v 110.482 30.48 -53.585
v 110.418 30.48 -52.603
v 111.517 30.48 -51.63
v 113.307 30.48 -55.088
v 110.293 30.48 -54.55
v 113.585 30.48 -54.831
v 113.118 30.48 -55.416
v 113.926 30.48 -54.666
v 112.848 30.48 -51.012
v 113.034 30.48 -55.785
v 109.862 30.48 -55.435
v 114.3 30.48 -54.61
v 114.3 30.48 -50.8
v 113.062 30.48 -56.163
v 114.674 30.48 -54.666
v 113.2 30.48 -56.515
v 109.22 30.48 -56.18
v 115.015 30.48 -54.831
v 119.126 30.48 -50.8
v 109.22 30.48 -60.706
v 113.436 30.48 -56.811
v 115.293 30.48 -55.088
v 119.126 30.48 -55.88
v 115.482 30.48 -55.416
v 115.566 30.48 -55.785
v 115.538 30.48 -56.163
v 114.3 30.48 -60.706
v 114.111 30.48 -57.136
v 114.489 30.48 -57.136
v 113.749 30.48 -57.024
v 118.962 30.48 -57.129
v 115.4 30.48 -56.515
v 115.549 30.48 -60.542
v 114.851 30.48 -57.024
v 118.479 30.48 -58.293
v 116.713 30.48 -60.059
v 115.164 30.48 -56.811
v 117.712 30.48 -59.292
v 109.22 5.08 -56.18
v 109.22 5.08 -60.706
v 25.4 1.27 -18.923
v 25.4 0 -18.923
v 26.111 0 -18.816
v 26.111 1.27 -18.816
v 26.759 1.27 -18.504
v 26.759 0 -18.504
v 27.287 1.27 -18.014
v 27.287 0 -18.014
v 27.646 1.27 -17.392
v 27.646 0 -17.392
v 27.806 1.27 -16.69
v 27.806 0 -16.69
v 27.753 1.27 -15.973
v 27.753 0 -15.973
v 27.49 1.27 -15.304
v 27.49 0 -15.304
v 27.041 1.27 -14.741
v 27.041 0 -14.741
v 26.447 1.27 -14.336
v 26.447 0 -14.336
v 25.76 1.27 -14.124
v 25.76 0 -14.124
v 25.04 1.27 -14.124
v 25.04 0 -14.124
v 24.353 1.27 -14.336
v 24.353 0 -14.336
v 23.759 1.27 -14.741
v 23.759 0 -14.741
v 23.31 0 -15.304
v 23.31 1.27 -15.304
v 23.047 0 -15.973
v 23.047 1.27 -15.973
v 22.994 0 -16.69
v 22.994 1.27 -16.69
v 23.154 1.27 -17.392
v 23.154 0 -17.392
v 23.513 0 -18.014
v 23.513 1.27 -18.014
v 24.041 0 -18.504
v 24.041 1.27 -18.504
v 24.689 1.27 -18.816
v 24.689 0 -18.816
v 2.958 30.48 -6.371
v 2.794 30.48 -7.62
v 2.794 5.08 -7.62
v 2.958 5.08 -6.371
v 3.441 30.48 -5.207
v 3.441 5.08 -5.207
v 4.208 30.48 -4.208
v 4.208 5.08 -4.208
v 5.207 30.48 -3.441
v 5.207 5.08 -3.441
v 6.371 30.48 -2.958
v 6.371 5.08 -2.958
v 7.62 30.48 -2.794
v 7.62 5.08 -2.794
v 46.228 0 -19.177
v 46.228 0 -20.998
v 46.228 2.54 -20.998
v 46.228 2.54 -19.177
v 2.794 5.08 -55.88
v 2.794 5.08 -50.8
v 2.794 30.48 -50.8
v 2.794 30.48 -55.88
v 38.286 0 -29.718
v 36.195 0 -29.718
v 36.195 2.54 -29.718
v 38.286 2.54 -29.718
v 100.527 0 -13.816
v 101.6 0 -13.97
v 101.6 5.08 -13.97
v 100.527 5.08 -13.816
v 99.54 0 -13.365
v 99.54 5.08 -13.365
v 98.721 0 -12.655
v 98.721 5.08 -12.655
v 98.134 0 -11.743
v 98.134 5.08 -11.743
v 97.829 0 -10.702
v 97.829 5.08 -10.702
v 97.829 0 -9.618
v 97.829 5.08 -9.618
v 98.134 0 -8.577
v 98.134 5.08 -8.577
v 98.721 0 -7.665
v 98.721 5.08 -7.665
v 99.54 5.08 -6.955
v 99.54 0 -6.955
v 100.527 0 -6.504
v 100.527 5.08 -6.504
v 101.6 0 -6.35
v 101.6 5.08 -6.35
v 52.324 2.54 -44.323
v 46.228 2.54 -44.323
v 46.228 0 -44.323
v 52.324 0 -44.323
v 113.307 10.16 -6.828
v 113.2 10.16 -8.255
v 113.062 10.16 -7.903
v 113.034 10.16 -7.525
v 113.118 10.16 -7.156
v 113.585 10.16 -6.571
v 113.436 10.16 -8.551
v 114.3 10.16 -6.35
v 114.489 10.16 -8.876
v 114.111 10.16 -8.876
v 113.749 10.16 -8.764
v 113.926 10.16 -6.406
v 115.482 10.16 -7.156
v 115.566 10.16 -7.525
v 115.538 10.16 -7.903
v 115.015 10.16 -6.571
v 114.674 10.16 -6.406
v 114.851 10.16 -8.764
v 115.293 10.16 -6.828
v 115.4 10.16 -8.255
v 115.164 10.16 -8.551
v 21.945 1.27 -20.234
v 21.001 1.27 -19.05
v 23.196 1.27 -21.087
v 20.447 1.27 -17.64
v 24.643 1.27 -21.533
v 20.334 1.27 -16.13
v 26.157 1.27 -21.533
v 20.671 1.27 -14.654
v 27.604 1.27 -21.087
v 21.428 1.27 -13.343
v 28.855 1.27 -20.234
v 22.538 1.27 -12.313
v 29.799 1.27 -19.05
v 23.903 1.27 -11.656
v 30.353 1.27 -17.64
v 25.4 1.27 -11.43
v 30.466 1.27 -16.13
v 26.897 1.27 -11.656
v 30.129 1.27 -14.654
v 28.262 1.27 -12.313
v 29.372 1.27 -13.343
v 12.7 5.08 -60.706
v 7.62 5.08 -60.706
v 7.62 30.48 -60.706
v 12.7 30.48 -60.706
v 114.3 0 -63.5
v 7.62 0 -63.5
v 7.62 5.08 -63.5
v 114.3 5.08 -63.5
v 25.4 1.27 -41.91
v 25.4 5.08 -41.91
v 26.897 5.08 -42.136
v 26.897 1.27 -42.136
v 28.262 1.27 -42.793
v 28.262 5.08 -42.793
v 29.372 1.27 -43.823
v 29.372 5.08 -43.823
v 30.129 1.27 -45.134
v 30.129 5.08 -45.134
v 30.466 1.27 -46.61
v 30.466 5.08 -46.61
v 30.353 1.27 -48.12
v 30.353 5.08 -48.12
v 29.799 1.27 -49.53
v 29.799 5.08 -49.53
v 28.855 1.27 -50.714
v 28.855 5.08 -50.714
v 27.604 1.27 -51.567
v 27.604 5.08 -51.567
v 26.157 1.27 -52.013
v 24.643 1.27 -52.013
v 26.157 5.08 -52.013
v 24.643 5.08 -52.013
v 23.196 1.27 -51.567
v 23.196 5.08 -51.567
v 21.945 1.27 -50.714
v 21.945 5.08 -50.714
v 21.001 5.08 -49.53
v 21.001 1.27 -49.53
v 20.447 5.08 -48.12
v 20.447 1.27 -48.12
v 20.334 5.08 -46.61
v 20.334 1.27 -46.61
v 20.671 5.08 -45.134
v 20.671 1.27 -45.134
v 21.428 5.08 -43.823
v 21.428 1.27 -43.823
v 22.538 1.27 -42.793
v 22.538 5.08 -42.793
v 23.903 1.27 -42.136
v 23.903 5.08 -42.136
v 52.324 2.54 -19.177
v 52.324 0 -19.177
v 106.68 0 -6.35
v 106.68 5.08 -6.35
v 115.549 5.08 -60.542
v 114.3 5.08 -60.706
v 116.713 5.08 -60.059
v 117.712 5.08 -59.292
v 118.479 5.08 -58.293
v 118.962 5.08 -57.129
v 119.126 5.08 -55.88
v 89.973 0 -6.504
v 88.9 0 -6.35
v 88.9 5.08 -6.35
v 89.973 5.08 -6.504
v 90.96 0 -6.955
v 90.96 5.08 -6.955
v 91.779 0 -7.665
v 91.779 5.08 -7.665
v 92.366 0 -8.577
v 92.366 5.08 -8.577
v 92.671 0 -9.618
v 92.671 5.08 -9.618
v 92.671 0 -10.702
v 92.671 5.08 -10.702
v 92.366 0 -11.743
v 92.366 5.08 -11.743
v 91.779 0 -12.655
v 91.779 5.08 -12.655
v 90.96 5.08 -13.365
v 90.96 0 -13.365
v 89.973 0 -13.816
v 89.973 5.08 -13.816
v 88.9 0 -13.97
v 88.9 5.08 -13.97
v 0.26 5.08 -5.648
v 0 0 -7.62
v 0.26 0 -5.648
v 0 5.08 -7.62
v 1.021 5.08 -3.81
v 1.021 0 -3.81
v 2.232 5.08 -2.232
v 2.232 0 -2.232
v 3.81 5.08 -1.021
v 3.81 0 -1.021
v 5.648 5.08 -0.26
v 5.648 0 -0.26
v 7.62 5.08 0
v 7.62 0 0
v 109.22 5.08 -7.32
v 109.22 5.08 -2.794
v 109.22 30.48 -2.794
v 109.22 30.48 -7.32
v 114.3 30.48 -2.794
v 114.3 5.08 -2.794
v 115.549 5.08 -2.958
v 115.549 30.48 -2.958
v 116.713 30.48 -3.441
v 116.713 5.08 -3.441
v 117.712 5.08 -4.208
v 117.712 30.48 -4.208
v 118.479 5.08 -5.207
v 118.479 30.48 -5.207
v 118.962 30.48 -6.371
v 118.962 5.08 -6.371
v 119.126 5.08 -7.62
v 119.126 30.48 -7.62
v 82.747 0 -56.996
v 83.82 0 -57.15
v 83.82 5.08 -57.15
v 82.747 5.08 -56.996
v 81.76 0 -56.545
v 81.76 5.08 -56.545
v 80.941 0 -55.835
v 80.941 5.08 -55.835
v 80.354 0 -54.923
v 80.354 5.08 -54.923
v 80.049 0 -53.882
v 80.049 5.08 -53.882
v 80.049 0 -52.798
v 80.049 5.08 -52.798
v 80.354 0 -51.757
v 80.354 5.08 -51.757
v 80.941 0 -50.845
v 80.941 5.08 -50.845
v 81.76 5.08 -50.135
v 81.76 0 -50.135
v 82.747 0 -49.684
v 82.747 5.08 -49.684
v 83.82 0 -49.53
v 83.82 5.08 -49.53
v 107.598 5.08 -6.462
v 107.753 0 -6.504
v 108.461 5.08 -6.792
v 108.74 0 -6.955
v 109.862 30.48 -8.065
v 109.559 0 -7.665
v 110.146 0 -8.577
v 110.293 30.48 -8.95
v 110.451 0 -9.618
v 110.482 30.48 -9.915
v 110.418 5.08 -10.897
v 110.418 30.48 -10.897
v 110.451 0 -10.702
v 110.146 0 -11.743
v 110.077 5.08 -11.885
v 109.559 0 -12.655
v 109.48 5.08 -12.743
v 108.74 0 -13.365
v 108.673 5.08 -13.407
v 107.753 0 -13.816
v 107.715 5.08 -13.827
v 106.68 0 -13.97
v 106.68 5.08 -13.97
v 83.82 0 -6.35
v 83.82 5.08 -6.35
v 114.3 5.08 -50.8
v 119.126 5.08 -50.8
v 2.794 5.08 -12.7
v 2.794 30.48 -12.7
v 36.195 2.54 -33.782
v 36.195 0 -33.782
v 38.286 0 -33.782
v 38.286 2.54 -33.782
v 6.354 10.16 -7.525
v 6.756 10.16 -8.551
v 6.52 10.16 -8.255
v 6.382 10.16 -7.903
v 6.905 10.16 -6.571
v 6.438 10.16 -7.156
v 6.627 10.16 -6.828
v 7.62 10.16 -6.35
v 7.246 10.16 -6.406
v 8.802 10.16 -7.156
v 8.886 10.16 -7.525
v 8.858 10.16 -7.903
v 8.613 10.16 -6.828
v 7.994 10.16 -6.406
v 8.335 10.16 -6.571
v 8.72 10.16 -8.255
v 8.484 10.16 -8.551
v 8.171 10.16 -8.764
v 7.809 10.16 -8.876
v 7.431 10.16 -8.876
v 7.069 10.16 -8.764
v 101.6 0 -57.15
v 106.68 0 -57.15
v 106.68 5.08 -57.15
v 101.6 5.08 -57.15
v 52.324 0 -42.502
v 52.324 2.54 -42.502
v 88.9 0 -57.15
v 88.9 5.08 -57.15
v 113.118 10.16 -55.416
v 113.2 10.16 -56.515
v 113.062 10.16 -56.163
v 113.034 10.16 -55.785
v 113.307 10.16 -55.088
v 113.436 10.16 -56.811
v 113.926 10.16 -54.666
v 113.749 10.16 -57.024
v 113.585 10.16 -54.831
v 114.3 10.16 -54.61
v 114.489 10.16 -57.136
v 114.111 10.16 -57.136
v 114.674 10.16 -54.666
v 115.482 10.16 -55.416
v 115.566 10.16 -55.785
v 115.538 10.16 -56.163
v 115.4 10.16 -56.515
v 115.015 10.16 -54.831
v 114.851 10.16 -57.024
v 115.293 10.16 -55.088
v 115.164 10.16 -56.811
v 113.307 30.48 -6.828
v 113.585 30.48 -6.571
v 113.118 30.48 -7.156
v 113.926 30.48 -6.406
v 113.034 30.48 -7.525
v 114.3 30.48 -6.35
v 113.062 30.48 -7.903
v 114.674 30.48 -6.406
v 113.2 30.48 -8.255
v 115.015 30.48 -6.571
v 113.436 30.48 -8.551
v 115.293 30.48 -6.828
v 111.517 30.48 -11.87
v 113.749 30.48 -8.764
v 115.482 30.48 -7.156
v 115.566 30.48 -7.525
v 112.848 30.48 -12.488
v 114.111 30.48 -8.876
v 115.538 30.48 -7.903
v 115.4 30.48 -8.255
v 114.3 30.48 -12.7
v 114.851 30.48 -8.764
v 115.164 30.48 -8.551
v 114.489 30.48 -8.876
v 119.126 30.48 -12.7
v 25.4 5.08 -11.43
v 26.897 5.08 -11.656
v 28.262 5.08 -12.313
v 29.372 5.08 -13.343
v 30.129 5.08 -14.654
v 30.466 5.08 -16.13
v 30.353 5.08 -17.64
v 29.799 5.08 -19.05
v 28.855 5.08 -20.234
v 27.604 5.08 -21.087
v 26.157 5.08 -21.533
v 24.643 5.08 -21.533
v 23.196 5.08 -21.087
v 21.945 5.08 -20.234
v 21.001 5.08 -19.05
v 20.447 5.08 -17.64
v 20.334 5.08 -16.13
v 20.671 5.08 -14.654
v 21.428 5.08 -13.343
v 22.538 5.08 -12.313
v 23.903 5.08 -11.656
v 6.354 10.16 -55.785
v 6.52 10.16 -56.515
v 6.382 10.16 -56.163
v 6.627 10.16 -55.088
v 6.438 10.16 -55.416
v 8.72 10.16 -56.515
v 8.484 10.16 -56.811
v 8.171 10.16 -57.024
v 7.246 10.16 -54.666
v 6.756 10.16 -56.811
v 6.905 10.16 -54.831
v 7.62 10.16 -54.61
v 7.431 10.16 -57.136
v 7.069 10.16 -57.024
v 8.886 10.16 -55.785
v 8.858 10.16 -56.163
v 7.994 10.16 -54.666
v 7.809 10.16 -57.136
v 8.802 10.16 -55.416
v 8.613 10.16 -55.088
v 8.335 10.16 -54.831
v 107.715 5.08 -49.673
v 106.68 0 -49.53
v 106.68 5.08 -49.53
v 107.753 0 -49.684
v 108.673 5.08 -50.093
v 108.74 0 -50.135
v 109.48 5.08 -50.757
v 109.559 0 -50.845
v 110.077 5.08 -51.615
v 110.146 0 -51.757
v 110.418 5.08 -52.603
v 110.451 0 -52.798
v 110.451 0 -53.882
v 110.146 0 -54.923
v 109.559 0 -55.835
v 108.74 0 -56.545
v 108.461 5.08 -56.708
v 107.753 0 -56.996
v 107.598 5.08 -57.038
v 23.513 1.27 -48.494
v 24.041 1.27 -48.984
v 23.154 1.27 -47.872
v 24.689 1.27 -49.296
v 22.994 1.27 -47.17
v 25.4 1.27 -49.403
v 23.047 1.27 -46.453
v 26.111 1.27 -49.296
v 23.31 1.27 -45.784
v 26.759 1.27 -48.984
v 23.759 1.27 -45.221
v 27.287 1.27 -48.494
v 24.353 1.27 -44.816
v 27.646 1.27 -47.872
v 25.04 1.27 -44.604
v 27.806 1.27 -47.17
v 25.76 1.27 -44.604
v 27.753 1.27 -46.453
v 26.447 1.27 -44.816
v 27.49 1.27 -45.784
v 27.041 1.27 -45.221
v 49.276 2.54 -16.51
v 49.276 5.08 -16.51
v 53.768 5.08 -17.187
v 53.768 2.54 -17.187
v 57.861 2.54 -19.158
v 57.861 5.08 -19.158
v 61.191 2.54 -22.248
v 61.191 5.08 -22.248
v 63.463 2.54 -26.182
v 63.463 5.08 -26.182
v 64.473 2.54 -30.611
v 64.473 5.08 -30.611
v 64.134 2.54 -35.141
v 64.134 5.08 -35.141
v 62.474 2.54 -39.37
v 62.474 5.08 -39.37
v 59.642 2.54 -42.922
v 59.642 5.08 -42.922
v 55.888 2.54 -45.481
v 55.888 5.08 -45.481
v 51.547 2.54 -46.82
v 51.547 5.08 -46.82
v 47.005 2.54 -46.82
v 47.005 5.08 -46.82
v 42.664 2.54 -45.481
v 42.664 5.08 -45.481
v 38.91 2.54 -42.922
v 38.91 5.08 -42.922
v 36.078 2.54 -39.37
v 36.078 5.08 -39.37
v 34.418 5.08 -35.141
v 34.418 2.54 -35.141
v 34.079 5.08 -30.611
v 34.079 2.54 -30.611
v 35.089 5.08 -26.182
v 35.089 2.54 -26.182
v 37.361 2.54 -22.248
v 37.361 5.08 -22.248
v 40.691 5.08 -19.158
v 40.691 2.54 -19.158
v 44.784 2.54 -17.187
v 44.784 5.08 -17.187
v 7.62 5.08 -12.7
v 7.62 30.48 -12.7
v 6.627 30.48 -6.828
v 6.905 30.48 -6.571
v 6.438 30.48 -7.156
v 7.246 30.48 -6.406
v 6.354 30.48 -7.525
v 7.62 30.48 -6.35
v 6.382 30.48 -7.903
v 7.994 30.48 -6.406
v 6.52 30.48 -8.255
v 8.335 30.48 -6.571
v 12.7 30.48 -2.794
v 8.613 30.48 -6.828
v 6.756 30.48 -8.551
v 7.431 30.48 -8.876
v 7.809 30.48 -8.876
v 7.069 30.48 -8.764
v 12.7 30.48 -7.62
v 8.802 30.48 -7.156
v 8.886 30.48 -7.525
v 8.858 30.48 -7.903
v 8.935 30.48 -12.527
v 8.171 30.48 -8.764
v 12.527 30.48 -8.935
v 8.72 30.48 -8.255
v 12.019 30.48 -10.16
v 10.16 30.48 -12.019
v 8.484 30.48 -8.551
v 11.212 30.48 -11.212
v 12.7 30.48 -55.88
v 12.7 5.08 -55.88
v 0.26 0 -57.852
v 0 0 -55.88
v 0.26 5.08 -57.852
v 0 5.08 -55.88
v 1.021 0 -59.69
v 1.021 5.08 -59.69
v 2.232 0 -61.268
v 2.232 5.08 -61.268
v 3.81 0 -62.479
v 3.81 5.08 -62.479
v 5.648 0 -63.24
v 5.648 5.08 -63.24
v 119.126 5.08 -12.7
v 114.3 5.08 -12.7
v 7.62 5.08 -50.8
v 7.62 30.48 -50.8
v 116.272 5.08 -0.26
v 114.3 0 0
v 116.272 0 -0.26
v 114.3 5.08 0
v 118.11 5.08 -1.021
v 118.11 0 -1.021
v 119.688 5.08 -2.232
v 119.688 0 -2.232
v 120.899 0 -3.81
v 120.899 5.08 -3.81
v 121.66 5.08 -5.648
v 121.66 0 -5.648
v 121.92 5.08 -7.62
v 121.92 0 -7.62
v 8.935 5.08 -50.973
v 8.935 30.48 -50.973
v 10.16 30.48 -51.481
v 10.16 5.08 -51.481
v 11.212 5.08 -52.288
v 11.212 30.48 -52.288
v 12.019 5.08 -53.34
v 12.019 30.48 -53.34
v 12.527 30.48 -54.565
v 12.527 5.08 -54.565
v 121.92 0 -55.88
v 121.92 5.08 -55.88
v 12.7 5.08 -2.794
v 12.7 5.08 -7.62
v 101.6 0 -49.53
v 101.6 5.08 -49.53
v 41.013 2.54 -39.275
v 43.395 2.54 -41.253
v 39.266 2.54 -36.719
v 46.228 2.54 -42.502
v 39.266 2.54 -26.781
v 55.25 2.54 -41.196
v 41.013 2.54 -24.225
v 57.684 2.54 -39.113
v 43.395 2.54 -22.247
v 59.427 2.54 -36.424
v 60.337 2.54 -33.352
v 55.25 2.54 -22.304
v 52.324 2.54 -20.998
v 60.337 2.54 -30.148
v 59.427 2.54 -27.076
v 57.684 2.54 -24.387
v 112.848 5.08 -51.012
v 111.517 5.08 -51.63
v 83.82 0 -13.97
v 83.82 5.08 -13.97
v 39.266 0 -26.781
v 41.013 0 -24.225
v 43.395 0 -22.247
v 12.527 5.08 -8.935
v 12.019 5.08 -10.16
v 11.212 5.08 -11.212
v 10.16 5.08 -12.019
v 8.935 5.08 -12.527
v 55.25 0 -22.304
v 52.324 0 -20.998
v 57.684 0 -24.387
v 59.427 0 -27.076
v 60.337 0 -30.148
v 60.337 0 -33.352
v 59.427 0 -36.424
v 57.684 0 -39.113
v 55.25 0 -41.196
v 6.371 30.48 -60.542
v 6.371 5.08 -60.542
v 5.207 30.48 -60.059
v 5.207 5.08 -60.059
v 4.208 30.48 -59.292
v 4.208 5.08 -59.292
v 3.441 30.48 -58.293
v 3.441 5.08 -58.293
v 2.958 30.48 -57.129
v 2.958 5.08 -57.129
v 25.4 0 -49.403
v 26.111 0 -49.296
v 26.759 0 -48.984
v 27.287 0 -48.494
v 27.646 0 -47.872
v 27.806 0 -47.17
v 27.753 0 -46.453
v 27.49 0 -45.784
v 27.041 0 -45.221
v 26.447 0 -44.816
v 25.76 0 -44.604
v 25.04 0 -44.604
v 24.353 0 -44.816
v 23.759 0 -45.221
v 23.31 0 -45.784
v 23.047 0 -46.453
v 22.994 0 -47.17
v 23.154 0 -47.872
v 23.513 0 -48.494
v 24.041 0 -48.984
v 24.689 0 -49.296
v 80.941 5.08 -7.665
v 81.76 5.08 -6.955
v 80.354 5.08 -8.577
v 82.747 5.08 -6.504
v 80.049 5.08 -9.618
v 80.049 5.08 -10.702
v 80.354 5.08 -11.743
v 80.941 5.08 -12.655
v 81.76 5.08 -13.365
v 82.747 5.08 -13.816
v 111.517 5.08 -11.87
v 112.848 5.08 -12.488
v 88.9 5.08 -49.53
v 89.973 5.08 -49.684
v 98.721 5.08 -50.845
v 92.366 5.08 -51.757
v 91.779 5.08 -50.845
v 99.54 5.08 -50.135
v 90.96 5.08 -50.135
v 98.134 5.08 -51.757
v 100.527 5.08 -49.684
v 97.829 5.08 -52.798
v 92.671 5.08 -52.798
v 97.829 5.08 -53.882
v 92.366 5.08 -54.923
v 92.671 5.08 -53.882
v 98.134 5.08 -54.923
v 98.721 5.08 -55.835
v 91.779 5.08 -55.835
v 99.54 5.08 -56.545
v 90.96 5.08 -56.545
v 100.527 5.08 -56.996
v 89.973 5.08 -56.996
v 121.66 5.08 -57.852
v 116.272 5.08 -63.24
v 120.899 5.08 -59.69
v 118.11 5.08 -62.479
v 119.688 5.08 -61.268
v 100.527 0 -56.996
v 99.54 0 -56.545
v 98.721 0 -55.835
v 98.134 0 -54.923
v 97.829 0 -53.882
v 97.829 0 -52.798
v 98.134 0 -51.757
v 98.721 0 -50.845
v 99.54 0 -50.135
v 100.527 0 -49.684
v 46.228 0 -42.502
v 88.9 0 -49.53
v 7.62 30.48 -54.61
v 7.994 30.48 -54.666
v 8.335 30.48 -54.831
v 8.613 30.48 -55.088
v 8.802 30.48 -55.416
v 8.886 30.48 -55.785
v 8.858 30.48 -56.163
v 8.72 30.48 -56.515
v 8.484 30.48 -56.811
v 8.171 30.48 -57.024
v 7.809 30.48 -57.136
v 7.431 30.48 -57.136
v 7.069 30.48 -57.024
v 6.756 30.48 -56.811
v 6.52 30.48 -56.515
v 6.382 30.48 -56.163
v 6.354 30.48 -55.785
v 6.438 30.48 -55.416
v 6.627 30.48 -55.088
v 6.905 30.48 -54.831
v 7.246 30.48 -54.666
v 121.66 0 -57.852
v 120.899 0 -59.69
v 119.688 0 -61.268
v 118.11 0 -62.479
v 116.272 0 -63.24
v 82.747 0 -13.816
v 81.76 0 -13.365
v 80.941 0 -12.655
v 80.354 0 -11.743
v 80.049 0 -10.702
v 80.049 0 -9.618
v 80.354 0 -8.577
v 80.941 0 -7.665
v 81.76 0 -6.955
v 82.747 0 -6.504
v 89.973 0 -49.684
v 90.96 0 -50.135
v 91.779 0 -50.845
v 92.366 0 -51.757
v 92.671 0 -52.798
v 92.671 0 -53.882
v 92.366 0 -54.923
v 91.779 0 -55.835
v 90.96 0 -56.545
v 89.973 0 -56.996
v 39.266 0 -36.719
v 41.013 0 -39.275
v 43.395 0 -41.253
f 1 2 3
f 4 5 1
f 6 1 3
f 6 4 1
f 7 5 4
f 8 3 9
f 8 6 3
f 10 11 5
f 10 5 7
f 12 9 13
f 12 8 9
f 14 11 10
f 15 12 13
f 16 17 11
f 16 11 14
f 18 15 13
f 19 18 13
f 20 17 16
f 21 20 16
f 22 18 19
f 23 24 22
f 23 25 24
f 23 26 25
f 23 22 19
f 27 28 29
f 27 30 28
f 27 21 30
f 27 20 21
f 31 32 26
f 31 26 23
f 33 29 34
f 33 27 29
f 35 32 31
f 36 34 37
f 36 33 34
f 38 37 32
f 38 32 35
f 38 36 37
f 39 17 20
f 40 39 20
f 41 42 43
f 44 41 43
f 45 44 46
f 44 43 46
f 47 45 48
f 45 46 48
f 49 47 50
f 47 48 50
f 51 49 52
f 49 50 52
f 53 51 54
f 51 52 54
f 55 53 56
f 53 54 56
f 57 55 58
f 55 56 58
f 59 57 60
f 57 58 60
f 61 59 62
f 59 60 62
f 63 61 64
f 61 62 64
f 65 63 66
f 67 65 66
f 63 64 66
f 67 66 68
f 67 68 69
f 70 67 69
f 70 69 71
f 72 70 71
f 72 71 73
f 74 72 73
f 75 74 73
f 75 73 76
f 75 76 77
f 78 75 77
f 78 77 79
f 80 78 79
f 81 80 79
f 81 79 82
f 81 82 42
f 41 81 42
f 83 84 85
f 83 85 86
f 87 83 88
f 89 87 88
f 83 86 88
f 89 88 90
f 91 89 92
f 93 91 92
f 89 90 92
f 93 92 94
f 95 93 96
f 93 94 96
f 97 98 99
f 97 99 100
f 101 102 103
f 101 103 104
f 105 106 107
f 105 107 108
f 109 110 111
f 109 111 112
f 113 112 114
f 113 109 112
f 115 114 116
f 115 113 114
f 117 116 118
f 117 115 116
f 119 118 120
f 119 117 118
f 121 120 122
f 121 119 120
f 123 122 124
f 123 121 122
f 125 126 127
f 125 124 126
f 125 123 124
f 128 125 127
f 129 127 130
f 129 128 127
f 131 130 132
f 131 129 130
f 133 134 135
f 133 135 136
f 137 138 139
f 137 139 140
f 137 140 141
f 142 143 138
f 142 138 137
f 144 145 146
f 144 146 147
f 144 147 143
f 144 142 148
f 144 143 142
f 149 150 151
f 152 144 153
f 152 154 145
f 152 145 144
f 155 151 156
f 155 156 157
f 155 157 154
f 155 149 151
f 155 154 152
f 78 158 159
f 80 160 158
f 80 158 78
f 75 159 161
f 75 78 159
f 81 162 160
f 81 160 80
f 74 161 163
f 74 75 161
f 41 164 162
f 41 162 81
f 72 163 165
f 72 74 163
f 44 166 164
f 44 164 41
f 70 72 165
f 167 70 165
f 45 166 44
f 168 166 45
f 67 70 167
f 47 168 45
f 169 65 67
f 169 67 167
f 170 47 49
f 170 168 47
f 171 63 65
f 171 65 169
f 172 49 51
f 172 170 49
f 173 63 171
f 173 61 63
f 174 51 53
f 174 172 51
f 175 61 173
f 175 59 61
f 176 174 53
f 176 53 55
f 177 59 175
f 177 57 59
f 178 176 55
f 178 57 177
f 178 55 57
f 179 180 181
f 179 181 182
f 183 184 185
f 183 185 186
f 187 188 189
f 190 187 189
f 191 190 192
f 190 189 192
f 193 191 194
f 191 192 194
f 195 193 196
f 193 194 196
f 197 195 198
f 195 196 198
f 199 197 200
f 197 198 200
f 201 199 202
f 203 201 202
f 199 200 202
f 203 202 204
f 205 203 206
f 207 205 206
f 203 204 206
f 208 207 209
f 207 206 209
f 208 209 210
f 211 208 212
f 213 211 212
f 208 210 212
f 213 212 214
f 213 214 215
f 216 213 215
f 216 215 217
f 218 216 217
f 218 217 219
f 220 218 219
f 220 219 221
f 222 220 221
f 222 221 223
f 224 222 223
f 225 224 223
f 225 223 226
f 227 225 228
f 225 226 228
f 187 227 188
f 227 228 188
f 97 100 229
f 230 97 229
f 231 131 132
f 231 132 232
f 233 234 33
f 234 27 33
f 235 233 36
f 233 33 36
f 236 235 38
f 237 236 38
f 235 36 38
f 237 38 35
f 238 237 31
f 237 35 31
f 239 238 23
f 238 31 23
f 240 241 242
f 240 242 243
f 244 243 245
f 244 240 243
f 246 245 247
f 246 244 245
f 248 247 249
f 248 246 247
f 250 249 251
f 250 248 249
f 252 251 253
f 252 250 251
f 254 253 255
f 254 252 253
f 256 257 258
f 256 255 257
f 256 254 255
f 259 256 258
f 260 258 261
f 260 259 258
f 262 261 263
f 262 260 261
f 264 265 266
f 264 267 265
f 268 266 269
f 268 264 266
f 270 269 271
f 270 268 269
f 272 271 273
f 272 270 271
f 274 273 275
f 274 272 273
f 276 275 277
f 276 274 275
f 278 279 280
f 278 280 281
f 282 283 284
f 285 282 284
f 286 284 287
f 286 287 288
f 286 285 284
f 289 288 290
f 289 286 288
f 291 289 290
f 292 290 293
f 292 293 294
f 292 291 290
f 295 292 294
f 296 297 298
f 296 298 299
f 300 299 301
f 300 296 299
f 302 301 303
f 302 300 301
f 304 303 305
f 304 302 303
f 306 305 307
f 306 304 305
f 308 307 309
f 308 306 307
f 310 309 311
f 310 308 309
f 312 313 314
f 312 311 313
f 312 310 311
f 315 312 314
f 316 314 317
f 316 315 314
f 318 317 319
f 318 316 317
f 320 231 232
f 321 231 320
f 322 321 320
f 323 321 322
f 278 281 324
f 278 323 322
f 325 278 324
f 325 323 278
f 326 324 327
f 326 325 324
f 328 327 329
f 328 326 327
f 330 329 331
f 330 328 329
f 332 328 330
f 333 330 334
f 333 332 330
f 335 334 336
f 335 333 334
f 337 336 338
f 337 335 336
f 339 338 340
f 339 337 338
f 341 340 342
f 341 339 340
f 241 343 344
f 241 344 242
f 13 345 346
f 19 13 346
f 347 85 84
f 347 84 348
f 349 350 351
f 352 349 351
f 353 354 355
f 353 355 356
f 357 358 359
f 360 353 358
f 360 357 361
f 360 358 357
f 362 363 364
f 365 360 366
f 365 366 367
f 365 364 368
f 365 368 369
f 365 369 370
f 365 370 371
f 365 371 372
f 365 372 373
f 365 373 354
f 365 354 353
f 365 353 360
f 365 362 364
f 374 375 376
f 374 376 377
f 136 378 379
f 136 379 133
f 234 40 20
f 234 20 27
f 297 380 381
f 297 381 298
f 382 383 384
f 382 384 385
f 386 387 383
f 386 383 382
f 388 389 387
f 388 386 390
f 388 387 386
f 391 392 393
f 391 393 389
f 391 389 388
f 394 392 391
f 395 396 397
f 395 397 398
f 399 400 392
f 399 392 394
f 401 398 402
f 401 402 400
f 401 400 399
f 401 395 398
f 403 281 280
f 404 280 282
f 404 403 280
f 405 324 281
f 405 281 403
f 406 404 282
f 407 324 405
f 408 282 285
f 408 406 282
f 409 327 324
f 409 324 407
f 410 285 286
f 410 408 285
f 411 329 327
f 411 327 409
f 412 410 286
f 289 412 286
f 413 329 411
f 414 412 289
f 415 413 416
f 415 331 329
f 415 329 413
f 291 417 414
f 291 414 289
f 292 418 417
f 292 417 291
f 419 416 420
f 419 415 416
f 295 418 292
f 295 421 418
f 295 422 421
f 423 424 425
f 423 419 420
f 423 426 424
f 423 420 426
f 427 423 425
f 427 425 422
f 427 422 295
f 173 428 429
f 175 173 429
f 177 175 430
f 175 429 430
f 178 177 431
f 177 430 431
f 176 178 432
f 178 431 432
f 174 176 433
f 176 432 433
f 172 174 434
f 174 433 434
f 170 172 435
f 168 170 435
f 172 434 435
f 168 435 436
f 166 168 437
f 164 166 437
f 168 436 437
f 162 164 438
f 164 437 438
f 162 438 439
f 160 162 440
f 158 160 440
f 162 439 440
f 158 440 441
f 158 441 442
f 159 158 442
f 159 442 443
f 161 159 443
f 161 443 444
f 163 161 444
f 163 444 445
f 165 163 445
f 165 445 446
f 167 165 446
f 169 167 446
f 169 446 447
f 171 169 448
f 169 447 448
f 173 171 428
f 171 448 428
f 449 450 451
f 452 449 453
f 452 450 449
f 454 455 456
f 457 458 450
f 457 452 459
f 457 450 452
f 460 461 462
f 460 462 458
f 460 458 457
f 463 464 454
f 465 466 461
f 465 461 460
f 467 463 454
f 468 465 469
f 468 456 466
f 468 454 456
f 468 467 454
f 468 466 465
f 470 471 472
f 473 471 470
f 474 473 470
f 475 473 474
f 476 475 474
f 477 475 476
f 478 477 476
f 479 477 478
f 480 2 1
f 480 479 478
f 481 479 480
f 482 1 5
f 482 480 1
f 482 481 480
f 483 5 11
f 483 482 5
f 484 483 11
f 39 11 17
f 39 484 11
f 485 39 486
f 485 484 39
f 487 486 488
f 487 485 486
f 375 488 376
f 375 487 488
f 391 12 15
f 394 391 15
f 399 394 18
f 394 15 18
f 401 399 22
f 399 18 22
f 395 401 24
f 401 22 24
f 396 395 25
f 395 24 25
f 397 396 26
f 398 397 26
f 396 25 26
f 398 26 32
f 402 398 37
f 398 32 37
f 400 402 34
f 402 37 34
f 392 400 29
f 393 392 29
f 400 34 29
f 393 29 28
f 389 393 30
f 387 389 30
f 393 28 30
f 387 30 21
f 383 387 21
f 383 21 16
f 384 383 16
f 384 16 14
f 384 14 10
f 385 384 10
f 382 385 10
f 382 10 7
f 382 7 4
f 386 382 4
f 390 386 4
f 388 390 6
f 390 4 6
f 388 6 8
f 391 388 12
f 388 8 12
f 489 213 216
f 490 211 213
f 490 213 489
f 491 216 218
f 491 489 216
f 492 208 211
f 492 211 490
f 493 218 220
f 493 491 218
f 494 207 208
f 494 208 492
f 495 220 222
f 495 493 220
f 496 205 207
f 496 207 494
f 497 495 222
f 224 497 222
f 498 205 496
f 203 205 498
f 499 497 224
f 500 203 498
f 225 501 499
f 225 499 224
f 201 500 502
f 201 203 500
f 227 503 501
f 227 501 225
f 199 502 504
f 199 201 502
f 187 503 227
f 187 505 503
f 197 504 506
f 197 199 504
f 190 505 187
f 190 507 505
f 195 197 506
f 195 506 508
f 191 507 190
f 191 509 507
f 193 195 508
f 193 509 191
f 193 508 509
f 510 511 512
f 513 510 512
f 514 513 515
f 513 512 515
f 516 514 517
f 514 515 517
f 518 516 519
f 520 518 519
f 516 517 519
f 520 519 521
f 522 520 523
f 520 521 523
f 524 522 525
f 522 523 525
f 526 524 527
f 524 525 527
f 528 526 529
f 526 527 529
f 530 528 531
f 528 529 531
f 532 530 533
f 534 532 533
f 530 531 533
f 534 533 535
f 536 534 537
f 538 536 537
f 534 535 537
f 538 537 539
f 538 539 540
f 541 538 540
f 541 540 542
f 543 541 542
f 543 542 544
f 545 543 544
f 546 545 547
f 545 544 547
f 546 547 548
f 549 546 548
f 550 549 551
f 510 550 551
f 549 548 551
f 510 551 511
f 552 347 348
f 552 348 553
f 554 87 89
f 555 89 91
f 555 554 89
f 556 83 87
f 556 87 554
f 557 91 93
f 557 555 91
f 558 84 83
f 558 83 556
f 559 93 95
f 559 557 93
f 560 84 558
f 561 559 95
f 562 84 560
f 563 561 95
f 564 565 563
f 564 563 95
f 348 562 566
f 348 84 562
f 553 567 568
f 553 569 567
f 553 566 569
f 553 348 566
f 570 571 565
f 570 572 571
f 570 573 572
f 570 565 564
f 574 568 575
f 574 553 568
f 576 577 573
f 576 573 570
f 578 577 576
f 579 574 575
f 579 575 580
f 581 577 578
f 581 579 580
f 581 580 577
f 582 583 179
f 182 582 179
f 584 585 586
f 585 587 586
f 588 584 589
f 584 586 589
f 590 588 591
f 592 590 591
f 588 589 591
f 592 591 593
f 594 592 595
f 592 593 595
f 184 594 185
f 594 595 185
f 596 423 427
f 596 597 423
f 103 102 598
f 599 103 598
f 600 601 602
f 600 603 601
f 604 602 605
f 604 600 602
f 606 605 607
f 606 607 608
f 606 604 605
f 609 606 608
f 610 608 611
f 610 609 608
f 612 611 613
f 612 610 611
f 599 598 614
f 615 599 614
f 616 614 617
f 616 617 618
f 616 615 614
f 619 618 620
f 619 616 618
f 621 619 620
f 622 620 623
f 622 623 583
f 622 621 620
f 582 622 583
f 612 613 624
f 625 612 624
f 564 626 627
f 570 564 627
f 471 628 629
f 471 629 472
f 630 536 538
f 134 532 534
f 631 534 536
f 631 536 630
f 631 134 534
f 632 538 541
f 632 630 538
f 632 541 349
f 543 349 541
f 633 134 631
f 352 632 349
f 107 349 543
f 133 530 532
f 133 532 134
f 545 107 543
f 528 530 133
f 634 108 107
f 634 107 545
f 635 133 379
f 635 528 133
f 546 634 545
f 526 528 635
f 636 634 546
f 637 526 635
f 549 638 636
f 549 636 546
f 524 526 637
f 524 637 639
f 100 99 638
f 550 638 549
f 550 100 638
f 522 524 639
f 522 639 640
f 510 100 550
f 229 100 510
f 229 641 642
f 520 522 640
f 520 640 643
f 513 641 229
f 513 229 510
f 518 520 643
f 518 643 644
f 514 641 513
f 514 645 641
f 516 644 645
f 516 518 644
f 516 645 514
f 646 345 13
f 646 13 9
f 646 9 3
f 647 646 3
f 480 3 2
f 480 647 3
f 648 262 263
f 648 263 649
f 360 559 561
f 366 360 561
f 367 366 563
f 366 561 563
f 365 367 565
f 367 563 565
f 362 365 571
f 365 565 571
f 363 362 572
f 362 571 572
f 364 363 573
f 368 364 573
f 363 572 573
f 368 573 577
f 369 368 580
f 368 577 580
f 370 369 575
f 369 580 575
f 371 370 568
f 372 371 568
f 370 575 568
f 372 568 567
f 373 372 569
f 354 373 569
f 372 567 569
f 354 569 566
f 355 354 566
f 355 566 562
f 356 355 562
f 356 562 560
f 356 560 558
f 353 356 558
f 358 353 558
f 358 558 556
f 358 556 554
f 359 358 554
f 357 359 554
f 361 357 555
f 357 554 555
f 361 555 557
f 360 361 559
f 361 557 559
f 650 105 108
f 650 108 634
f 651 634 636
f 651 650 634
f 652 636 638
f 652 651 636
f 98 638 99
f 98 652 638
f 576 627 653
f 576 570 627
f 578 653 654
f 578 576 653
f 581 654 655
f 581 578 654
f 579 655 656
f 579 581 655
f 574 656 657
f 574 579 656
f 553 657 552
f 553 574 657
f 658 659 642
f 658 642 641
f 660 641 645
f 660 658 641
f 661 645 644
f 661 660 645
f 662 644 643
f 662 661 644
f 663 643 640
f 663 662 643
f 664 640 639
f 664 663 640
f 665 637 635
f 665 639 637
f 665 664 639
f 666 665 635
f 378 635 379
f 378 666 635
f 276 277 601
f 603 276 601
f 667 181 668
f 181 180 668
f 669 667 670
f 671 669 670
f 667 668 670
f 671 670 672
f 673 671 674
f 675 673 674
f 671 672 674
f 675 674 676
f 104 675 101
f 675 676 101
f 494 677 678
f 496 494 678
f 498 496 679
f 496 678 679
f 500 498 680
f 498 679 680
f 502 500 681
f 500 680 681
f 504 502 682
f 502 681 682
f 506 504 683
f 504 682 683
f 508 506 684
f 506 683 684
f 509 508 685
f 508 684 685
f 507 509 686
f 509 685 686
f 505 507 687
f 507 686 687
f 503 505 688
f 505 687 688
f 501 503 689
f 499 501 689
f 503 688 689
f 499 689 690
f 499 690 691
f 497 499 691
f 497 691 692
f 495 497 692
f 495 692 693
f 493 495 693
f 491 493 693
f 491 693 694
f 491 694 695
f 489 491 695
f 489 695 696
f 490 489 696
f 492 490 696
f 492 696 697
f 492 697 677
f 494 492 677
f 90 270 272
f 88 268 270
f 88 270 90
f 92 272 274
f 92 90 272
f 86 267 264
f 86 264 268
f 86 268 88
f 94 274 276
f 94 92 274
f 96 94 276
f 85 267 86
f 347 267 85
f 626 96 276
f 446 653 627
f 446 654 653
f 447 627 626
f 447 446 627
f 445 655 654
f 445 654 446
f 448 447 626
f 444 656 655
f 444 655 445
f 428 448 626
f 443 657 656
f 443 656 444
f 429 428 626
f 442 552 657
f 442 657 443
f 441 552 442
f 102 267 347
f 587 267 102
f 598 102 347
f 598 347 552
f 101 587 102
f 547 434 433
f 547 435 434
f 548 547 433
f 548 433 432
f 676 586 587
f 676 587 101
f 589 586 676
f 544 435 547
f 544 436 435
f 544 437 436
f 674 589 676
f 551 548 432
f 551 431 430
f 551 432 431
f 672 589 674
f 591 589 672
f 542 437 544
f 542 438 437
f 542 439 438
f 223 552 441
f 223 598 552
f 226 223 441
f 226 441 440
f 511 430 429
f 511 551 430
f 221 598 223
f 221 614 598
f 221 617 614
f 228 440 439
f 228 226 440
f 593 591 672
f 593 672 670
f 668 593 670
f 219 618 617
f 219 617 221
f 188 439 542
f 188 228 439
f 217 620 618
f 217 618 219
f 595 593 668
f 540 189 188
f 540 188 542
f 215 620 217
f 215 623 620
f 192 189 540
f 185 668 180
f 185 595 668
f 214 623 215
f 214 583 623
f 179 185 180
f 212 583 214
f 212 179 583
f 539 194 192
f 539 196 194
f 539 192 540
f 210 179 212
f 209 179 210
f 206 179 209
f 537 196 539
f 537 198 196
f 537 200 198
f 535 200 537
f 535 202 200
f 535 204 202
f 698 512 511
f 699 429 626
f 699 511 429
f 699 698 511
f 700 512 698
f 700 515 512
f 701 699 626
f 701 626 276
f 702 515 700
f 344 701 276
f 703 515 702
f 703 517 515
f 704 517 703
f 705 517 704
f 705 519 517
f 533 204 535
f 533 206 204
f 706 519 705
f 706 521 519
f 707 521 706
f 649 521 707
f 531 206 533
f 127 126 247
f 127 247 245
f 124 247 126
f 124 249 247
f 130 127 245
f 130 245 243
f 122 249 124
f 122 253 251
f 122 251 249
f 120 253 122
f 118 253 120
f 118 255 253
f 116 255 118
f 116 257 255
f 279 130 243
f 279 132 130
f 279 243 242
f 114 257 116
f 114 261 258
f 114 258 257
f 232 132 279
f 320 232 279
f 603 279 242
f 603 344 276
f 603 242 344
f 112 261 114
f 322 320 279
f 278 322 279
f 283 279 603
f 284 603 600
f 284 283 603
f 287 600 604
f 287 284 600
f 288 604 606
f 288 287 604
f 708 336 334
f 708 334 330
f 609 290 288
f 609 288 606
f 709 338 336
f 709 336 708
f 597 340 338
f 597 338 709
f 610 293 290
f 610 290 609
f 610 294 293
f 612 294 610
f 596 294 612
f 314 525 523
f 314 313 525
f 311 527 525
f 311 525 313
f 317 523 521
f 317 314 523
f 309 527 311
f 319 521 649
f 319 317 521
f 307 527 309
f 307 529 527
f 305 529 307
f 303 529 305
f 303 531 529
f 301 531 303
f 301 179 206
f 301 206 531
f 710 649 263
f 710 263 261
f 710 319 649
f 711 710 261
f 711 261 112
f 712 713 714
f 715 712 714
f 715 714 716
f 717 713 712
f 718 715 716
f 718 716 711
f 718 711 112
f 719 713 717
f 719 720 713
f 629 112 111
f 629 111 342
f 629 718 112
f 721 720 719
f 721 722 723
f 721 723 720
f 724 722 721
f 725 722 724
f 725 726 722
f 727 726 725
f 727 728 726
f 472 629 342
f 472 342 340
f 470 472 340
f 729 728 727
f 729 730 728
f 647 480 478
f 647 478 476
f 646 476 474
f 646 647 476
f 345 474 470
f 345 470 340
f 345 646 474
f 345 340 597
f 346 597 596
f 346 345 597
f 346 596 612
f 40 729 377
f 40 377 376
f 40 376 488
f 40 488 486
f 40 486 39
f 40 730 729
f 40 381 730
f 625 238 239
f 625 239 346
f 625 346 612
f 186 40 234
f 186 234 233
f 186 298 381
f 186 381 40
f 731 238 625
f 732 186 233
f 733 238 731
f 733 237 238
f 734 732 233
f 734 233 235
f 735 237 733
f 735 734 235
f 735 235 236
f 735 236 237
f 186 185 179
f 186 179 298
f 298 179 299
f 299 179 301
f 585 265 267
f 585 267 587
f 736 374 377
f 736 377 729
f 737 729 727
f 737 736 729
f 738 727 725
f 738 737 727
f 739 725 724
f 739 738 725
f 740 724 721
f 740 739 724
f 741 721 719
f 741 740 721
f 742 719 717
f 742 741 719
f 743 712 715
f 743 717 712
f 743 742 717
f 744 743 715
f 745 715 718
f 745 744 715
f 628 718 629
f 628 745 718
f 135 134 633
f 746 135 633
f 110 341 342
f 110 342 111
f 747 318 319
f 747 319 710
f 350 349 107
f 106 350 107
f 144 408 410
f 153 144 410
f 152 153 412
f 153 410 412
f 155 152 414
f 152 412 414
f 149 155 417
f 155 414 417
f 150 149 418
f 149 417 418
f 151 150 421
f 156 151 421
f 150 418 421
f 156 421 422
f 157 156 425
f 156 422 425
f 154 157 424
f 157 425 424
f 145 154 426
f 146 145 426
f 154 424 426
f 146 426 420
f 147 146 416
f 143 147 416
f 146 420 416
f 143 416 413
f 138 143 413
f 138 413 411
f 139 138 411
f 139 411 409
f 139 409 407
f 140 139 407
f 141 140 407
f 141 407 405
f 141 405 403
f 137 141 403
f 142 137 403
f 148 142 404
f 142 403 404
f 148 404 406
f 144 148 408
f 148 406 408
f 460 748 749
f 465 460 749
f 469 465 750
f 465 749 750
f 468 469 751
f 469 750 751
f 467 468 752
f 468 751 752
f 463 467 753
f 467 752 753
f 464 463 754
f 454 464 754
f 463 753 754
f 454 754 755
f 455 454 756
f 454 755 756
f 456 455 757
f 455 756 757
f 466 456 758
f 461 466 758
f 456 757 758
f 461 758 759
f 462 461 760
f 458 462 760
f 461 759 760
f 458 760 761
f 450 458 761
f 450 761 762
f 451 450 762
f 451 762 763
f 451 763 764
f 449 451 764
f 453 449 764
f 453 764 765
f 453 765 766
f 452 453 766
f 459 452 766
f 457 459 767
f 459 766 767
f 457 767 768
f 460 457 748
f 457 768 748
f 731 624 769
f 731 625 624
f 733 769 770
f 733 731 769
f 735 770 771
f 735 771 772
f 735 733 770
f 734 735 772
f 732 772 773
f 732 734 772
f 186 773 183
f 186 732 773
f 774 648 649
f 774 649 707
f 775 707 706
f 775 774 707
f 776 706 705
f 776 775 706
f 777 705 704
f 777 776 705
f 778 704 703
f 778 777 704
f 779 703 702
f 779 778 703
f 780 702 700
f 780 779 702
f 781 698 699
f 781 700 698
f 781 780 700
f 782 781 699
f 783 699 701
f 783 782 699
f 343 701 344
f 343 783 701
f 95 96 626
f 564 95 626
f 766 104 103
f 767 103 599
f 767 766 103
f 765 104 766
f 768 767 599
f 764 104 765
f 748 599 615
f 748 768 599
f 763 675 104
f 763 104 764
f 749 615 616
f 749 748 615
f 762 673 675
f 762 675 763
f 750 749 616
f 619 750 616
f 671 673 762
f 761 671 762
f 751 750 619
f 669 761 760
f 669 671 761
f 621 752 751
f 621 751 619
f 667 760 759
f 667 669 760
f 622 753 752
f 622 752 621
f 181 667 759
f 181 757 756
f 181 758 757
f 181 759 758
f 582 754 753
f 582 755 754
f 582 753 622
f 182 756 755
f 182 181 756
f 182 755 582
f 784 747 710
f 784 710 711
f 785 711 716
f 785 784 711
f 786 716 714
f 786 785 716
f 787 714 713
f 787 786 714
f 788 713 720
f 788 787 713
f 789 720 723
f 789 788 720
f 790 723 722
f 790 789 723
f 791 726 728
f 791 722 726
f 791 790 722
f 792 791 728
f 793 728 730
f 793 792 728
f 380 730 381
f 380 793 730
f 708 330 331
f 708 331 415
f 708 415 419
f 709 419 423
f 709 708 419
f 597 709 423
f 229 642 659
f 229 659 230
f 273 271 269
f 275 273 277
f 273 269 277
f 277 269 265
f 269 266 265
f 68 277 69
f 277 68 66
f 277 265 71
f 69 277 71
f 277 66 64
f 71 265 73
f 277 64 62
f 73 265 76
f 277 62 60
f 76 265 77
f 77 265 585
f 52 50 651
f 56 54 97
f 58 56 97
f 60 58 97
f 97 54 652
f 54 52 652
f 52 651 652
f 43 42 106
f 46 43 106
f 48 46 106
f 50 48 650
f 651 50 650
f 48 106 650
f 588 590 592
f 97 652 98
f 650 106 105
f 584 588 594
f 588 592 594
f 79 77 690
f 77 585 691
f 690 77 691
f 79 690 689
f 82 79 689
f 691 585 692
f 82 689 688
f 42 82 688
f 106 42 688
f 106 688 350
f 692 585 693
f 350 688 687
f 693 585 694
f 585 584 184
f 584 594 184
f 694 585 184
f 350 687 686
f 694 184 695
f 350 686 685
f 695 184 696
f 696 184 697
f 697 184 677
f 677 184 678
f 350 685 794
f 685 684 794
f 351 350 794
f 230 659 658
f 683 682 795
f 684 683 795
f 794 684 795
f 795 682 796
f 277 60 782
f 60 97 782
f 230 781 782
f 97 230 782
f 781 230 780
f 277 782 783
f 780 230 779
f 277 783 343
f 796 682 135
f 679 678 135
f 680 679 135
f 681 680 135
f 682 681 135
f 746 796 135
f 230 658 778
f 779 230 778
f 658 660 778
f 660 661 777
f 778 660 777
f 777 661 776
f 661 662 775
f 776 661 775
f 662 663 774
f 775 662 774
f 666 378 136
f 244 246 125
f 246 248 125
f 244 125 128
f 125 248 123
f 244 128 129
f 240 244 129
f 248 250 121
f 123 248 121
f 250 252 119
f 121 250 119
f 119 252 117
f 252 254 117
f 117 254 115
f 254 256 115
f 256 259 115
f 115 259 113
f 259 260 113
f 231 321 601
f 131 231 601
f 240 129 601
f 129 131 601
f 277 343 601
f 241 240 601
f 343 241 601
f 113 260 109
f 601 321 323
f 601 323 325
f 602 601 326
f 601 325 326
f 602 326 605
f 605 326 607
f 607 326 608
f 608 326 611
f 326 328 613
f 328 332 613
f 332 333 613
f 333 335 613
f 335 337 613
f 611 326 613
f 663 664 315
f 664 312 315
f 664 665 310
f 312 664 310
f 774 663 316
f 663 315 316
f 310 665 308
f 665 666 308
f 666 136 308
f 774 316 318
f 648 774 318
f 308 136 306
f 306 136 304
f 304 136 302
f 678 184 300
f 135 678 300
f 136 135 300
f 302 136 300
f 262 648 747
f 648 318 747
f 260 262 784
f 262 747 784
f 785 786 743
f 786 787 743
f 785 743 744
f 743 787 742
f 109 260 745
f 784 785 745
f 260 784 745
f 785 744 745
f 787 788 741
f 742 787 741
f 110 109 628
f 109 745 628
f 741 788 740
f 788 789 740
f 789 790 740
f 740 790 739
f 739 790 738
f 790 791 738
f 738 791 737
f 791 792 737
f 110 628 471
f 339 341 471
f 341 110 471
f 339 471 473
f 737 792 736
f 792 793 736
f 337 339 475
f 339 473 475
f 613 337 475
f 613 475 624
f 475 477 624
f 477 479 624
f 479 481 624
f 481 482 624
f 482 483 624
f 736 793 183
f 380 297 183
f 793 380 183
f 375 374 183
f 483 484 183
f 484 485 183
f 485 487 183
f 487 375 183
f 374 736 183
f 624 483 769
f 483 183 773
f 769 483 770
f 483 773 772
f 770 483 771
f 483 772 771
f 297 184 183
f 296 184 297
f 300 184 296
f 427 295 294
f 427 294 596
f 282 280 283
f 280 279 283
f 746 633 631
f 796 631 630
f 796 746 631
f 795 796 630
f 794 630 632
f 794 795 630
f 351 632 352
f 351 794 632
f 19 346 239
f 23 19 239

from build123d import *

# Parameters (mm, degrees)
SKETCH1_W           = 121.92
SKETCH1_H           = 63.5
BOSS_EXTRUDE1_DEPTH = 5.08
FILLET1_R           = 7.62
SKETCH2_W           = 9.906
SKETCH2_H           = 9.906
BOSS_EXTRUDE2_DEPTH = 22.86
CUT_EXTRUDE2_REACH  = 142.276
SKETCH5_R           = 10.9982
CUT_EXTRUDE3_REACH  = 142.276
SKETCH6_R           = 1.9939
SKETCH7_R           = 5.08
CUT_EXTRUDE4_DEPTH  = 3.81
SKETCH8_R           = 15.24
CUT_EXTRUDE5_DEPTH  = 2.54
CUT_EXTRUDE6_REACH  = 142.276
SKETCH9_R           = 2.159
CUT_EXTRUDE7_REACH  = 142.276
SKETCH11_W          = 143.390320112
SKETCH11_H          = 95.839563071
CUT_EXTRUDE8_DEPTH  = 5.08
SKETCH14_W          = 9.906
SKETCH14_H          = 9.906
BOSS_EXTRUDE4_DEPTH = 7.62
FILLET2_R           = 4.826
FILLET3_R           = 5.08
SKETCH15_R          = 1.27
CUT_EXTRUDE10_DEPTH = 20.32
CUT_EXTRUDE11_REACH = 142.804
SKETCH16_R          = 2.413
CUT_EXTRUDE12_START = -2.54
SKETCH17_W          = 6.096
SKETCH17_H          = 25.146
SKETCH17_W_2        = 2.38136189
SKETCH17_H_2        = 4.064
CUT_EXTRUDE12_DEPTH = 2.54
CUT_EXTRUDE13_REACH = 142.804


with BuildPart() as part:
    # Sketch1 → Boss-Extrude1 (new body)
    with BuildSketch(Plane(origin=(0, 0, 0), x_dir=(1, 0, 0), z_dir=(0, 1, 0))):
        with Locations((60.96, 31.75)):
            Rectangle(SKETCH1_W, SKETCH1_H)
    extrude(amount=BOSS_EXTRUDE1_DEPTH)

    # Fillet1
    fillet1_edges = [part.edges().sort_by_distance(p)[0] for p in [
        (0, 2.54, -63.5),
        (121.92, 2.54, -63.5),
        (121.92, 2.54, 0),
        (0, 2.54, 0),
    ]]
    fillet(fillet1_edges, radius=FILLET1_R)

    # Sketch2 → Boss-Extrude2 (add)
    with BuildSketch(Plane(origin=(0, 5.08, 0), x_dir=(1, 0, 0), z_dir=(0, 1, 0))):
        with Locations((7.747, 55.753)):
            Rectangle(SKETCH2_W, SKETCH2_H)
        with Locations((114.173, 55.753)):
            Rectangle(SKETCH2_W, SKETCH2_H)
        with Locations((114.173, 7.747)):
            Rectangle(SKETCH2_W, SKETCH2_H)
        with Locations((7.747, 7.747)):
            Rectangle(SKETCH2_W, SKETCH2_H)
    extrude(amount=BOSS_EXTRUDE2_DEPTH)

    # Sketch5 → Cut-Extrude2 (cut, up to next)
    with BuildSketch(Plane.XZ, mode=Mode.PRIVATE) as cut_extrude2_sk1:
        with Locations(Location((49.276, -31.75, 0), (0, 0, 270))):
            Circle(SKETCH5_R)
    cut_extrude2_tool1 = extrude(cut_extrude2_sk1.sketch, amount=-CUT_EXTRUDE2_REACH, mode=Mode.PRIVATE) & part.part
    add(cut_extrude2_tool1.solids().sort_by_distance((49.276, 0, -31.75))[0], mode=Mode.SUBTRACT)

    # Sketch6 → Cut-Extrude3 (cut, up to next)
    with BuildSketch(Plane.XZ, mode=Mode.PRIVATE) as cut_extrude3_sk1:
        with Locations(Location((25.4, -16.51, 0), (0, 0, 270))):
            Circle(SKETCH6_R)
    cut_extrude3_tool1 = extrude(cut_extrude3_sk1.sketch, amount=-CUT_EXTRUDE3_REACH, mode=Mode.PRIVATE) & part.part
    # Sketch6 → Cut-Extrude3 (cut, up to next)
    with BuildSketch(Plane.XZ, mode=Mode.PRIVATE) as cut_extrude3_sk2:
        with Locations(Location((25.4, -46.99, 0), (0, 0, 270))):
            Circle(SKETCH6_R)
    cut_extrude3_tool2 = extrude(cut_extrude3_sk2.sketch, amount=-CUT_EXTRUDE3_REACH, mode=Mode.PRIVATE) & part.part
    add(cut_extrude3_tool1.solids().sort_by_distance((25.4, 0, -16.51))[0], mode=Mode.SUBTRACT)
    add(cut_extrude3_tool2.solids().sort_by_distance((25.4, 0, -46.99))[0], mode=Mode.SUBTRACT)

    # Sketch7 → Cut-Extrude4 (cut)
    with BuildSketch(Plane(origin=(0, 5.08, 0), x_dir=(1, 0, 0), z_dir=(0, 1, 0))):
        with Locations(Location((25.4, 46.99, 0), (0, 0, 270))):
            Circle(SKETCH7_R)
        with Locations(Location((25.4, 16.51, 0), (0, 0, 270))):
            Circle(SKETCH7_R)
    extrude(amount=-CUT_EXTRUDE4_DEPTH, mode=Mode.SUBTRACT)

    # Sketch8 → Cut-Extrude5 (cut)
    with BuildSketch(Plane(origin=(0, 5.08, 0), x_dir=(1, 0, 0), z_dir=(0, 1, 0))):
        with Locations(Location((49.276, 31.75, 0), (0, 0, 270))):
            Circle(SKETCH8_R)
    extrude(amount=-CUT_EXTRUDE5_DEPTH, mode=Mode.SUBTRACT)

    # Sketch9 → Cut-Extrude6 (cut, up to next)
    with BuildSketch(Plane.XZ, mode=Mode.PRIVATE) as cut_extrude6_sk1:
        with Locations(Location((25.4, -16.51, 0), (0, 0, 270))):
            Circle(SKETCH9_R)
    cut_extrude6_tool1 = extrude(cut_extrude6_sk1.sketch, amount=-CUT_EXTRUDE6_REACH, mode=Mode.PRIVATE) & part.part
    # Sketch9 → Cut-Extrude6 (cut, up to next)
    with BuildSketch(Plane.XZ, mode=Mode.PRIVATE) as cut_extrude6_sk2:
        with Locations(Location((25.4, -46.99, 0), (0, 0, 270))):
            Circle(SKETCH9_R)
    cut_extrude6_tool2 = extrude(cut_extrude6_sk2.sketch, amount=-CUT_EXTRUDE6_REACH, mode=Mode.PRIVATE) & part.part
    add(cut_extrude6_tool1.solids().sort_by_distance((25.4, 0, -16.51))[0], mode=Mode.SUBTRACT)
    add(cut_extrude6_tool2.solids().sort_by_distance((25.4, 0, -46.99))[0], mode=Mode.SUBTRACT)

    # Sketch10 → Cut-Extrude7 (cut, up to next)
    with BuildSketch(Plane.XZ, mode=Mode.PRIVATE) as cut_extrude7_sk1:
        with BuildLine():
            Line((52.324, -42.502333328), (52.324, -43.561))
            Line((52.324, -43.561), (46.228, -43.561))
            Line((46.228, -43.561), (46.228, -42.502333328))
            ThreePointArc((46.228, -42.502333328), (40.758626429, -38.985836057), (38.172393559, -33.02))
            Line((38.172393559, -33.02), (36.957, -33.02))
            Line((36.957, -33.02), (36.957, -30.48))
            Line((36.957, -30.48), (38.172393559, -30.48))
            ThreePointArc((38.172393559, -30.48), (40.758626429, -24.514163943), (46.228, -20.997666672))
            Line((46.228, -20.997666672), (46.228, -19.939))
            Line((46.228, -19.939), (52.324, -19.939))
            Line((52.324, -19.939), (52.324, -20.997666672))
            ThreePointArc((52.324, -20.997666672), (60.452, -31.75), (52.324, -42.502333328))
        make_face()
    cut_extrude7_tool1 = extrude(cut_extrude7_sk1.sketch, amount=-CUT_EXTRUDE7_REACH, mode=Mode.PRIVATE) & part.part
    add(cut_extrude7_tool1.solids().sort_by_distance((49.190062, 0, -31.75))[0], mode=Mode.SUBTRACT)

    # Sketch11 → Cut-Extrude8 (cut)
    with BuildSketch(Plane(origin=(0, 27.94, 0), x_dir=(1, 0, 0), z_dir=(0, 1, 0))):
        with Locations((59.888985007, 35.781035454)):
            Rectangle(SKETCH11_W, SKETCH11_H)
    extrude(amount=-CUT_EXTRUDE8_DEPTH, mode=Mode.SUBTRACT)

    # Sketch14 → Boss-Extrude4 (add)
    with BuildSketch(Plane(origin=(0, 22.86, 0), x_dir=(1, 0, 0), z_dir=(0, 1, 0))):
        with Locations((114.173, 7.747)):
            Rectangle(SKETCH14_W, SKETCH14_H)
        with Locations((7.747, 7.747)):
            Rectangle(SKETCH14_W, SKETCH14_H)
        with Locations((114.173, 55.753)):
            Rectangle(SKETCH14_W, SKETCH14_H)
        with Locations((7.747, 55.753)):
            Rectangle(SKETCH14_W, SKETCH14_H)
    extrude(amount=BOSS_EXTRUDE4_DEPTH)

    # Fillet2
    fillet2_edges = [part.edges().sort_by_distance(p)[0] for p in [
        (2.794, 17.78, -2.794),
        (119.126, 17.78, -2.794),
        (119.126, 17.78, -60.706),
        (2.794, 17.78, -60.706),
    ]]
    fillet(fillet2_edges, radius=FILLET2_R)

    # Fillet3
    fillet3_edges = [part.edges().sort_by_distance(p)[0] for p in [
        (12.7, 17.78, -12.7),
        (109.22, 17.78, -12.7),
        (109.22, 17.78, -50.8),
        (12.7, 17.78, -50.8),
    ]]
    fillet(fillet3_edges, radius=FILLET3_R)

    # Sketch15 → Cut-Extrude10 (cut)
    with BuildSketch(Plane(origin=(0, 30.48, 0), x_dir=(1, 0, 0), z_dir=(0, 1, 0))):
        with Locations(Location((114.3, 7.62, 0), (0, 0, 270))):
            Circle(SKETCH15_R)
        with Locations(Location((7.62, 7.62, 0), (0, 0, 270))):
            Circle(SKETCH15_R)
        with Locations(Location((114.3, 55.88, 0), (0, 0, 270))):
            Circle(SKETCH15_R)
        with Locations(Location((7.62, 55.88, 0), (0, 0, 270))):
            Circle(SKETCH15_R)
    extrude(amount=-CUT_EXTRUDE10_DEPTH, mode=Mode.SUBTRACT)

    # Sketch16 → Cut-Extrude11 (cut, up to next)
    with BuildSketch(Plane.XZ, mode=Mode.PRIVATE) as cut_extrude11_sk1:
        with Locations(Location((25.4, -16.51, 0), (0, 0, 270))):
            Circle(SKETCH16_R)
    cut_extrude11_tool1 = extrude(cut_extrude11_sk1.sketch, amount=-CUT_EXTRUDE11_REACH, mode=Mode.PRIVATE) & part.part
    # Sketch16 → Cut-Extrude11 (cut, up to next)
    with BuildSketch(Plane.XZ, mode=Mode.PRIVATE) as cut_extrude11_sk2:
        with Locations(Location((25.4, -46.99, 0), (0, 0, 270))):
            Circle(SKETCH16_R)
    cut_extrude11_tool2 = extrude(cut_extrude11_sk2.sketch, amount=-CUT_EXTRUDE11_REACH, mode=Mode.PRIVATE) & part.part
    add(cut_extrude11_tool1.solids().sort_by_distance((25.4, 0, -16.51))[0], mode=Mode.SUBTRACT)
    add(cut_extrude11_tool2.solids().sort_by_distance((25.4, 0, -46.99))[0], mode=Mode.SUBTRACT)

    # Sketch17 → Cut-Extrude12 (cut)
    with BuildSketch(Plane.XZ.offset(CUT_EXTRUDE12_START)):
        with Locations((49.276, -31.75)):
            Rectangle(SKETCH17_W, SKETCH17_H)
        with Locations((37.385680945, -31.75)):
            Rectangle(SKETCH17_W_2, SKETCH17_H_2)
    extrude(amount=CUT_EXTRUDE12_DEPTH, mode=Mode.SUBTRACT)

    # Sketch18 → Cut-Extrude13 (cut, up to next)
    with BuildSketch(Plane.XZ, mode=Mode.PRIVATE) as cut_extrude13_sk1:
        with BuildLine():
            Line((106.68, -13.97), (101.6, -13.97))
            ThreePointArc((101.6, -13.97), (97.79, -10.16), (101.6, -6.35))
            Line((101.6, -6.35), (106.68, -6.35))
            ThreePointArc((106.68, -6.35), (110.49, -10.16), (106.68, -13.97))
        make_face()
    cut_extrude13_tool1 = extrude(cut_extrude13_sk1.sketch, amount=-CUT_EXTRUDE13_REACH, mode=Mode.PRIVATE) & part.part
    # Sketch18 → Cut-Extrude13 (cut, up to next)
    with BuildSketch(Plane.XZ, mode=Mode.PRIVATE) as cut_extrude13_sk2:
        with BuildLine():
            Line((88.9, -13.97), (83.82, -13.97))
            ThreePointArc((83.82, -13.97), (80.01, -10.16), (83.82, -6.35))
            Line((83.82, -6.35), (88.9, -6.35))
            ThreePointArc((88.9, -6.35), (92.71, -10.16), (88.9, -13.97))
        make_face()
    cut_extrude13_tool2 = extrude(cut_extrude13_sk2.sketch, amount=-CUT_EXTRUDE13_REACH, mode=Mode.PRIVATE) & part.part
    # Sketch18 → Cut-Extrude13 (cut, up to next)
    with BuildSketch(Plane.XZ, mode=Mode.PRIVATE) as cut_extrude13_sk3:
        with BuildLine():
            Line((88.9, -57.15), (83.82, -57.15))
            ThreePointArc((83.82, -57.15), (80.01, -53.34), (83.82, -49.53))
            Line((83.82, -49.53), (88.9, -49.53))
            ThreePointArc((88.9, -49.53), (92.71, -53.34), (88.9, -57.15))
        make_face()
    cut_extrude13_tool3 = extrude(cut_extrude13_sk3.sketch, amount=-CUT_EXTRUDE13_REACH, mode=Mode.PRIVATE) & part.part
    # Sketch18 → Cut-Extrude13 (cut, up to next)
    with BuildSketch(Plane.XZ, mode=Mode.PRIVATE) as cut_extrude13_sk4:
        with BuildLine():
            Line((106.68, -57.15), (101.6, -57.15))
            ThreePointArc((101.6, -57.15), (97.79, -53.34), (101.6, -49.53))
            Line((101.6, -49.53), (106.68, -49.53))
            ThreePointArc((106.68, -49.53), (110.49, -53.34), (106.68, -57.15))
        make_face()
    cut_extrude13_tool4 = extrude(cut_extrude13_sk4.sketch, amount=-CUT_EXTRUDE13_REACH, mode=Mode.PRIVATE) & part.part
    add(cut_extrude13_tool1.solids().sort_by_distance((104.14, 0, -10.16))[0], mode=Mode.SUBTRACT)
    add(cut_extrude13_tool2.solids().sort_by_distance((86.36, 0, -10.16))[0], mode=Mode.SUBTRACT)
    add(cut_extrude13_tool3.solids().sort_by_distance((86.36, 0, -53.34))[0], mode=Mode.SUBTRACT)
    add(cut_extrude13_tool4.solids().sort_by_distance((104.14, 0, -53.34))[0], mode=Mode.SUBTRACT)


solid = part.part
